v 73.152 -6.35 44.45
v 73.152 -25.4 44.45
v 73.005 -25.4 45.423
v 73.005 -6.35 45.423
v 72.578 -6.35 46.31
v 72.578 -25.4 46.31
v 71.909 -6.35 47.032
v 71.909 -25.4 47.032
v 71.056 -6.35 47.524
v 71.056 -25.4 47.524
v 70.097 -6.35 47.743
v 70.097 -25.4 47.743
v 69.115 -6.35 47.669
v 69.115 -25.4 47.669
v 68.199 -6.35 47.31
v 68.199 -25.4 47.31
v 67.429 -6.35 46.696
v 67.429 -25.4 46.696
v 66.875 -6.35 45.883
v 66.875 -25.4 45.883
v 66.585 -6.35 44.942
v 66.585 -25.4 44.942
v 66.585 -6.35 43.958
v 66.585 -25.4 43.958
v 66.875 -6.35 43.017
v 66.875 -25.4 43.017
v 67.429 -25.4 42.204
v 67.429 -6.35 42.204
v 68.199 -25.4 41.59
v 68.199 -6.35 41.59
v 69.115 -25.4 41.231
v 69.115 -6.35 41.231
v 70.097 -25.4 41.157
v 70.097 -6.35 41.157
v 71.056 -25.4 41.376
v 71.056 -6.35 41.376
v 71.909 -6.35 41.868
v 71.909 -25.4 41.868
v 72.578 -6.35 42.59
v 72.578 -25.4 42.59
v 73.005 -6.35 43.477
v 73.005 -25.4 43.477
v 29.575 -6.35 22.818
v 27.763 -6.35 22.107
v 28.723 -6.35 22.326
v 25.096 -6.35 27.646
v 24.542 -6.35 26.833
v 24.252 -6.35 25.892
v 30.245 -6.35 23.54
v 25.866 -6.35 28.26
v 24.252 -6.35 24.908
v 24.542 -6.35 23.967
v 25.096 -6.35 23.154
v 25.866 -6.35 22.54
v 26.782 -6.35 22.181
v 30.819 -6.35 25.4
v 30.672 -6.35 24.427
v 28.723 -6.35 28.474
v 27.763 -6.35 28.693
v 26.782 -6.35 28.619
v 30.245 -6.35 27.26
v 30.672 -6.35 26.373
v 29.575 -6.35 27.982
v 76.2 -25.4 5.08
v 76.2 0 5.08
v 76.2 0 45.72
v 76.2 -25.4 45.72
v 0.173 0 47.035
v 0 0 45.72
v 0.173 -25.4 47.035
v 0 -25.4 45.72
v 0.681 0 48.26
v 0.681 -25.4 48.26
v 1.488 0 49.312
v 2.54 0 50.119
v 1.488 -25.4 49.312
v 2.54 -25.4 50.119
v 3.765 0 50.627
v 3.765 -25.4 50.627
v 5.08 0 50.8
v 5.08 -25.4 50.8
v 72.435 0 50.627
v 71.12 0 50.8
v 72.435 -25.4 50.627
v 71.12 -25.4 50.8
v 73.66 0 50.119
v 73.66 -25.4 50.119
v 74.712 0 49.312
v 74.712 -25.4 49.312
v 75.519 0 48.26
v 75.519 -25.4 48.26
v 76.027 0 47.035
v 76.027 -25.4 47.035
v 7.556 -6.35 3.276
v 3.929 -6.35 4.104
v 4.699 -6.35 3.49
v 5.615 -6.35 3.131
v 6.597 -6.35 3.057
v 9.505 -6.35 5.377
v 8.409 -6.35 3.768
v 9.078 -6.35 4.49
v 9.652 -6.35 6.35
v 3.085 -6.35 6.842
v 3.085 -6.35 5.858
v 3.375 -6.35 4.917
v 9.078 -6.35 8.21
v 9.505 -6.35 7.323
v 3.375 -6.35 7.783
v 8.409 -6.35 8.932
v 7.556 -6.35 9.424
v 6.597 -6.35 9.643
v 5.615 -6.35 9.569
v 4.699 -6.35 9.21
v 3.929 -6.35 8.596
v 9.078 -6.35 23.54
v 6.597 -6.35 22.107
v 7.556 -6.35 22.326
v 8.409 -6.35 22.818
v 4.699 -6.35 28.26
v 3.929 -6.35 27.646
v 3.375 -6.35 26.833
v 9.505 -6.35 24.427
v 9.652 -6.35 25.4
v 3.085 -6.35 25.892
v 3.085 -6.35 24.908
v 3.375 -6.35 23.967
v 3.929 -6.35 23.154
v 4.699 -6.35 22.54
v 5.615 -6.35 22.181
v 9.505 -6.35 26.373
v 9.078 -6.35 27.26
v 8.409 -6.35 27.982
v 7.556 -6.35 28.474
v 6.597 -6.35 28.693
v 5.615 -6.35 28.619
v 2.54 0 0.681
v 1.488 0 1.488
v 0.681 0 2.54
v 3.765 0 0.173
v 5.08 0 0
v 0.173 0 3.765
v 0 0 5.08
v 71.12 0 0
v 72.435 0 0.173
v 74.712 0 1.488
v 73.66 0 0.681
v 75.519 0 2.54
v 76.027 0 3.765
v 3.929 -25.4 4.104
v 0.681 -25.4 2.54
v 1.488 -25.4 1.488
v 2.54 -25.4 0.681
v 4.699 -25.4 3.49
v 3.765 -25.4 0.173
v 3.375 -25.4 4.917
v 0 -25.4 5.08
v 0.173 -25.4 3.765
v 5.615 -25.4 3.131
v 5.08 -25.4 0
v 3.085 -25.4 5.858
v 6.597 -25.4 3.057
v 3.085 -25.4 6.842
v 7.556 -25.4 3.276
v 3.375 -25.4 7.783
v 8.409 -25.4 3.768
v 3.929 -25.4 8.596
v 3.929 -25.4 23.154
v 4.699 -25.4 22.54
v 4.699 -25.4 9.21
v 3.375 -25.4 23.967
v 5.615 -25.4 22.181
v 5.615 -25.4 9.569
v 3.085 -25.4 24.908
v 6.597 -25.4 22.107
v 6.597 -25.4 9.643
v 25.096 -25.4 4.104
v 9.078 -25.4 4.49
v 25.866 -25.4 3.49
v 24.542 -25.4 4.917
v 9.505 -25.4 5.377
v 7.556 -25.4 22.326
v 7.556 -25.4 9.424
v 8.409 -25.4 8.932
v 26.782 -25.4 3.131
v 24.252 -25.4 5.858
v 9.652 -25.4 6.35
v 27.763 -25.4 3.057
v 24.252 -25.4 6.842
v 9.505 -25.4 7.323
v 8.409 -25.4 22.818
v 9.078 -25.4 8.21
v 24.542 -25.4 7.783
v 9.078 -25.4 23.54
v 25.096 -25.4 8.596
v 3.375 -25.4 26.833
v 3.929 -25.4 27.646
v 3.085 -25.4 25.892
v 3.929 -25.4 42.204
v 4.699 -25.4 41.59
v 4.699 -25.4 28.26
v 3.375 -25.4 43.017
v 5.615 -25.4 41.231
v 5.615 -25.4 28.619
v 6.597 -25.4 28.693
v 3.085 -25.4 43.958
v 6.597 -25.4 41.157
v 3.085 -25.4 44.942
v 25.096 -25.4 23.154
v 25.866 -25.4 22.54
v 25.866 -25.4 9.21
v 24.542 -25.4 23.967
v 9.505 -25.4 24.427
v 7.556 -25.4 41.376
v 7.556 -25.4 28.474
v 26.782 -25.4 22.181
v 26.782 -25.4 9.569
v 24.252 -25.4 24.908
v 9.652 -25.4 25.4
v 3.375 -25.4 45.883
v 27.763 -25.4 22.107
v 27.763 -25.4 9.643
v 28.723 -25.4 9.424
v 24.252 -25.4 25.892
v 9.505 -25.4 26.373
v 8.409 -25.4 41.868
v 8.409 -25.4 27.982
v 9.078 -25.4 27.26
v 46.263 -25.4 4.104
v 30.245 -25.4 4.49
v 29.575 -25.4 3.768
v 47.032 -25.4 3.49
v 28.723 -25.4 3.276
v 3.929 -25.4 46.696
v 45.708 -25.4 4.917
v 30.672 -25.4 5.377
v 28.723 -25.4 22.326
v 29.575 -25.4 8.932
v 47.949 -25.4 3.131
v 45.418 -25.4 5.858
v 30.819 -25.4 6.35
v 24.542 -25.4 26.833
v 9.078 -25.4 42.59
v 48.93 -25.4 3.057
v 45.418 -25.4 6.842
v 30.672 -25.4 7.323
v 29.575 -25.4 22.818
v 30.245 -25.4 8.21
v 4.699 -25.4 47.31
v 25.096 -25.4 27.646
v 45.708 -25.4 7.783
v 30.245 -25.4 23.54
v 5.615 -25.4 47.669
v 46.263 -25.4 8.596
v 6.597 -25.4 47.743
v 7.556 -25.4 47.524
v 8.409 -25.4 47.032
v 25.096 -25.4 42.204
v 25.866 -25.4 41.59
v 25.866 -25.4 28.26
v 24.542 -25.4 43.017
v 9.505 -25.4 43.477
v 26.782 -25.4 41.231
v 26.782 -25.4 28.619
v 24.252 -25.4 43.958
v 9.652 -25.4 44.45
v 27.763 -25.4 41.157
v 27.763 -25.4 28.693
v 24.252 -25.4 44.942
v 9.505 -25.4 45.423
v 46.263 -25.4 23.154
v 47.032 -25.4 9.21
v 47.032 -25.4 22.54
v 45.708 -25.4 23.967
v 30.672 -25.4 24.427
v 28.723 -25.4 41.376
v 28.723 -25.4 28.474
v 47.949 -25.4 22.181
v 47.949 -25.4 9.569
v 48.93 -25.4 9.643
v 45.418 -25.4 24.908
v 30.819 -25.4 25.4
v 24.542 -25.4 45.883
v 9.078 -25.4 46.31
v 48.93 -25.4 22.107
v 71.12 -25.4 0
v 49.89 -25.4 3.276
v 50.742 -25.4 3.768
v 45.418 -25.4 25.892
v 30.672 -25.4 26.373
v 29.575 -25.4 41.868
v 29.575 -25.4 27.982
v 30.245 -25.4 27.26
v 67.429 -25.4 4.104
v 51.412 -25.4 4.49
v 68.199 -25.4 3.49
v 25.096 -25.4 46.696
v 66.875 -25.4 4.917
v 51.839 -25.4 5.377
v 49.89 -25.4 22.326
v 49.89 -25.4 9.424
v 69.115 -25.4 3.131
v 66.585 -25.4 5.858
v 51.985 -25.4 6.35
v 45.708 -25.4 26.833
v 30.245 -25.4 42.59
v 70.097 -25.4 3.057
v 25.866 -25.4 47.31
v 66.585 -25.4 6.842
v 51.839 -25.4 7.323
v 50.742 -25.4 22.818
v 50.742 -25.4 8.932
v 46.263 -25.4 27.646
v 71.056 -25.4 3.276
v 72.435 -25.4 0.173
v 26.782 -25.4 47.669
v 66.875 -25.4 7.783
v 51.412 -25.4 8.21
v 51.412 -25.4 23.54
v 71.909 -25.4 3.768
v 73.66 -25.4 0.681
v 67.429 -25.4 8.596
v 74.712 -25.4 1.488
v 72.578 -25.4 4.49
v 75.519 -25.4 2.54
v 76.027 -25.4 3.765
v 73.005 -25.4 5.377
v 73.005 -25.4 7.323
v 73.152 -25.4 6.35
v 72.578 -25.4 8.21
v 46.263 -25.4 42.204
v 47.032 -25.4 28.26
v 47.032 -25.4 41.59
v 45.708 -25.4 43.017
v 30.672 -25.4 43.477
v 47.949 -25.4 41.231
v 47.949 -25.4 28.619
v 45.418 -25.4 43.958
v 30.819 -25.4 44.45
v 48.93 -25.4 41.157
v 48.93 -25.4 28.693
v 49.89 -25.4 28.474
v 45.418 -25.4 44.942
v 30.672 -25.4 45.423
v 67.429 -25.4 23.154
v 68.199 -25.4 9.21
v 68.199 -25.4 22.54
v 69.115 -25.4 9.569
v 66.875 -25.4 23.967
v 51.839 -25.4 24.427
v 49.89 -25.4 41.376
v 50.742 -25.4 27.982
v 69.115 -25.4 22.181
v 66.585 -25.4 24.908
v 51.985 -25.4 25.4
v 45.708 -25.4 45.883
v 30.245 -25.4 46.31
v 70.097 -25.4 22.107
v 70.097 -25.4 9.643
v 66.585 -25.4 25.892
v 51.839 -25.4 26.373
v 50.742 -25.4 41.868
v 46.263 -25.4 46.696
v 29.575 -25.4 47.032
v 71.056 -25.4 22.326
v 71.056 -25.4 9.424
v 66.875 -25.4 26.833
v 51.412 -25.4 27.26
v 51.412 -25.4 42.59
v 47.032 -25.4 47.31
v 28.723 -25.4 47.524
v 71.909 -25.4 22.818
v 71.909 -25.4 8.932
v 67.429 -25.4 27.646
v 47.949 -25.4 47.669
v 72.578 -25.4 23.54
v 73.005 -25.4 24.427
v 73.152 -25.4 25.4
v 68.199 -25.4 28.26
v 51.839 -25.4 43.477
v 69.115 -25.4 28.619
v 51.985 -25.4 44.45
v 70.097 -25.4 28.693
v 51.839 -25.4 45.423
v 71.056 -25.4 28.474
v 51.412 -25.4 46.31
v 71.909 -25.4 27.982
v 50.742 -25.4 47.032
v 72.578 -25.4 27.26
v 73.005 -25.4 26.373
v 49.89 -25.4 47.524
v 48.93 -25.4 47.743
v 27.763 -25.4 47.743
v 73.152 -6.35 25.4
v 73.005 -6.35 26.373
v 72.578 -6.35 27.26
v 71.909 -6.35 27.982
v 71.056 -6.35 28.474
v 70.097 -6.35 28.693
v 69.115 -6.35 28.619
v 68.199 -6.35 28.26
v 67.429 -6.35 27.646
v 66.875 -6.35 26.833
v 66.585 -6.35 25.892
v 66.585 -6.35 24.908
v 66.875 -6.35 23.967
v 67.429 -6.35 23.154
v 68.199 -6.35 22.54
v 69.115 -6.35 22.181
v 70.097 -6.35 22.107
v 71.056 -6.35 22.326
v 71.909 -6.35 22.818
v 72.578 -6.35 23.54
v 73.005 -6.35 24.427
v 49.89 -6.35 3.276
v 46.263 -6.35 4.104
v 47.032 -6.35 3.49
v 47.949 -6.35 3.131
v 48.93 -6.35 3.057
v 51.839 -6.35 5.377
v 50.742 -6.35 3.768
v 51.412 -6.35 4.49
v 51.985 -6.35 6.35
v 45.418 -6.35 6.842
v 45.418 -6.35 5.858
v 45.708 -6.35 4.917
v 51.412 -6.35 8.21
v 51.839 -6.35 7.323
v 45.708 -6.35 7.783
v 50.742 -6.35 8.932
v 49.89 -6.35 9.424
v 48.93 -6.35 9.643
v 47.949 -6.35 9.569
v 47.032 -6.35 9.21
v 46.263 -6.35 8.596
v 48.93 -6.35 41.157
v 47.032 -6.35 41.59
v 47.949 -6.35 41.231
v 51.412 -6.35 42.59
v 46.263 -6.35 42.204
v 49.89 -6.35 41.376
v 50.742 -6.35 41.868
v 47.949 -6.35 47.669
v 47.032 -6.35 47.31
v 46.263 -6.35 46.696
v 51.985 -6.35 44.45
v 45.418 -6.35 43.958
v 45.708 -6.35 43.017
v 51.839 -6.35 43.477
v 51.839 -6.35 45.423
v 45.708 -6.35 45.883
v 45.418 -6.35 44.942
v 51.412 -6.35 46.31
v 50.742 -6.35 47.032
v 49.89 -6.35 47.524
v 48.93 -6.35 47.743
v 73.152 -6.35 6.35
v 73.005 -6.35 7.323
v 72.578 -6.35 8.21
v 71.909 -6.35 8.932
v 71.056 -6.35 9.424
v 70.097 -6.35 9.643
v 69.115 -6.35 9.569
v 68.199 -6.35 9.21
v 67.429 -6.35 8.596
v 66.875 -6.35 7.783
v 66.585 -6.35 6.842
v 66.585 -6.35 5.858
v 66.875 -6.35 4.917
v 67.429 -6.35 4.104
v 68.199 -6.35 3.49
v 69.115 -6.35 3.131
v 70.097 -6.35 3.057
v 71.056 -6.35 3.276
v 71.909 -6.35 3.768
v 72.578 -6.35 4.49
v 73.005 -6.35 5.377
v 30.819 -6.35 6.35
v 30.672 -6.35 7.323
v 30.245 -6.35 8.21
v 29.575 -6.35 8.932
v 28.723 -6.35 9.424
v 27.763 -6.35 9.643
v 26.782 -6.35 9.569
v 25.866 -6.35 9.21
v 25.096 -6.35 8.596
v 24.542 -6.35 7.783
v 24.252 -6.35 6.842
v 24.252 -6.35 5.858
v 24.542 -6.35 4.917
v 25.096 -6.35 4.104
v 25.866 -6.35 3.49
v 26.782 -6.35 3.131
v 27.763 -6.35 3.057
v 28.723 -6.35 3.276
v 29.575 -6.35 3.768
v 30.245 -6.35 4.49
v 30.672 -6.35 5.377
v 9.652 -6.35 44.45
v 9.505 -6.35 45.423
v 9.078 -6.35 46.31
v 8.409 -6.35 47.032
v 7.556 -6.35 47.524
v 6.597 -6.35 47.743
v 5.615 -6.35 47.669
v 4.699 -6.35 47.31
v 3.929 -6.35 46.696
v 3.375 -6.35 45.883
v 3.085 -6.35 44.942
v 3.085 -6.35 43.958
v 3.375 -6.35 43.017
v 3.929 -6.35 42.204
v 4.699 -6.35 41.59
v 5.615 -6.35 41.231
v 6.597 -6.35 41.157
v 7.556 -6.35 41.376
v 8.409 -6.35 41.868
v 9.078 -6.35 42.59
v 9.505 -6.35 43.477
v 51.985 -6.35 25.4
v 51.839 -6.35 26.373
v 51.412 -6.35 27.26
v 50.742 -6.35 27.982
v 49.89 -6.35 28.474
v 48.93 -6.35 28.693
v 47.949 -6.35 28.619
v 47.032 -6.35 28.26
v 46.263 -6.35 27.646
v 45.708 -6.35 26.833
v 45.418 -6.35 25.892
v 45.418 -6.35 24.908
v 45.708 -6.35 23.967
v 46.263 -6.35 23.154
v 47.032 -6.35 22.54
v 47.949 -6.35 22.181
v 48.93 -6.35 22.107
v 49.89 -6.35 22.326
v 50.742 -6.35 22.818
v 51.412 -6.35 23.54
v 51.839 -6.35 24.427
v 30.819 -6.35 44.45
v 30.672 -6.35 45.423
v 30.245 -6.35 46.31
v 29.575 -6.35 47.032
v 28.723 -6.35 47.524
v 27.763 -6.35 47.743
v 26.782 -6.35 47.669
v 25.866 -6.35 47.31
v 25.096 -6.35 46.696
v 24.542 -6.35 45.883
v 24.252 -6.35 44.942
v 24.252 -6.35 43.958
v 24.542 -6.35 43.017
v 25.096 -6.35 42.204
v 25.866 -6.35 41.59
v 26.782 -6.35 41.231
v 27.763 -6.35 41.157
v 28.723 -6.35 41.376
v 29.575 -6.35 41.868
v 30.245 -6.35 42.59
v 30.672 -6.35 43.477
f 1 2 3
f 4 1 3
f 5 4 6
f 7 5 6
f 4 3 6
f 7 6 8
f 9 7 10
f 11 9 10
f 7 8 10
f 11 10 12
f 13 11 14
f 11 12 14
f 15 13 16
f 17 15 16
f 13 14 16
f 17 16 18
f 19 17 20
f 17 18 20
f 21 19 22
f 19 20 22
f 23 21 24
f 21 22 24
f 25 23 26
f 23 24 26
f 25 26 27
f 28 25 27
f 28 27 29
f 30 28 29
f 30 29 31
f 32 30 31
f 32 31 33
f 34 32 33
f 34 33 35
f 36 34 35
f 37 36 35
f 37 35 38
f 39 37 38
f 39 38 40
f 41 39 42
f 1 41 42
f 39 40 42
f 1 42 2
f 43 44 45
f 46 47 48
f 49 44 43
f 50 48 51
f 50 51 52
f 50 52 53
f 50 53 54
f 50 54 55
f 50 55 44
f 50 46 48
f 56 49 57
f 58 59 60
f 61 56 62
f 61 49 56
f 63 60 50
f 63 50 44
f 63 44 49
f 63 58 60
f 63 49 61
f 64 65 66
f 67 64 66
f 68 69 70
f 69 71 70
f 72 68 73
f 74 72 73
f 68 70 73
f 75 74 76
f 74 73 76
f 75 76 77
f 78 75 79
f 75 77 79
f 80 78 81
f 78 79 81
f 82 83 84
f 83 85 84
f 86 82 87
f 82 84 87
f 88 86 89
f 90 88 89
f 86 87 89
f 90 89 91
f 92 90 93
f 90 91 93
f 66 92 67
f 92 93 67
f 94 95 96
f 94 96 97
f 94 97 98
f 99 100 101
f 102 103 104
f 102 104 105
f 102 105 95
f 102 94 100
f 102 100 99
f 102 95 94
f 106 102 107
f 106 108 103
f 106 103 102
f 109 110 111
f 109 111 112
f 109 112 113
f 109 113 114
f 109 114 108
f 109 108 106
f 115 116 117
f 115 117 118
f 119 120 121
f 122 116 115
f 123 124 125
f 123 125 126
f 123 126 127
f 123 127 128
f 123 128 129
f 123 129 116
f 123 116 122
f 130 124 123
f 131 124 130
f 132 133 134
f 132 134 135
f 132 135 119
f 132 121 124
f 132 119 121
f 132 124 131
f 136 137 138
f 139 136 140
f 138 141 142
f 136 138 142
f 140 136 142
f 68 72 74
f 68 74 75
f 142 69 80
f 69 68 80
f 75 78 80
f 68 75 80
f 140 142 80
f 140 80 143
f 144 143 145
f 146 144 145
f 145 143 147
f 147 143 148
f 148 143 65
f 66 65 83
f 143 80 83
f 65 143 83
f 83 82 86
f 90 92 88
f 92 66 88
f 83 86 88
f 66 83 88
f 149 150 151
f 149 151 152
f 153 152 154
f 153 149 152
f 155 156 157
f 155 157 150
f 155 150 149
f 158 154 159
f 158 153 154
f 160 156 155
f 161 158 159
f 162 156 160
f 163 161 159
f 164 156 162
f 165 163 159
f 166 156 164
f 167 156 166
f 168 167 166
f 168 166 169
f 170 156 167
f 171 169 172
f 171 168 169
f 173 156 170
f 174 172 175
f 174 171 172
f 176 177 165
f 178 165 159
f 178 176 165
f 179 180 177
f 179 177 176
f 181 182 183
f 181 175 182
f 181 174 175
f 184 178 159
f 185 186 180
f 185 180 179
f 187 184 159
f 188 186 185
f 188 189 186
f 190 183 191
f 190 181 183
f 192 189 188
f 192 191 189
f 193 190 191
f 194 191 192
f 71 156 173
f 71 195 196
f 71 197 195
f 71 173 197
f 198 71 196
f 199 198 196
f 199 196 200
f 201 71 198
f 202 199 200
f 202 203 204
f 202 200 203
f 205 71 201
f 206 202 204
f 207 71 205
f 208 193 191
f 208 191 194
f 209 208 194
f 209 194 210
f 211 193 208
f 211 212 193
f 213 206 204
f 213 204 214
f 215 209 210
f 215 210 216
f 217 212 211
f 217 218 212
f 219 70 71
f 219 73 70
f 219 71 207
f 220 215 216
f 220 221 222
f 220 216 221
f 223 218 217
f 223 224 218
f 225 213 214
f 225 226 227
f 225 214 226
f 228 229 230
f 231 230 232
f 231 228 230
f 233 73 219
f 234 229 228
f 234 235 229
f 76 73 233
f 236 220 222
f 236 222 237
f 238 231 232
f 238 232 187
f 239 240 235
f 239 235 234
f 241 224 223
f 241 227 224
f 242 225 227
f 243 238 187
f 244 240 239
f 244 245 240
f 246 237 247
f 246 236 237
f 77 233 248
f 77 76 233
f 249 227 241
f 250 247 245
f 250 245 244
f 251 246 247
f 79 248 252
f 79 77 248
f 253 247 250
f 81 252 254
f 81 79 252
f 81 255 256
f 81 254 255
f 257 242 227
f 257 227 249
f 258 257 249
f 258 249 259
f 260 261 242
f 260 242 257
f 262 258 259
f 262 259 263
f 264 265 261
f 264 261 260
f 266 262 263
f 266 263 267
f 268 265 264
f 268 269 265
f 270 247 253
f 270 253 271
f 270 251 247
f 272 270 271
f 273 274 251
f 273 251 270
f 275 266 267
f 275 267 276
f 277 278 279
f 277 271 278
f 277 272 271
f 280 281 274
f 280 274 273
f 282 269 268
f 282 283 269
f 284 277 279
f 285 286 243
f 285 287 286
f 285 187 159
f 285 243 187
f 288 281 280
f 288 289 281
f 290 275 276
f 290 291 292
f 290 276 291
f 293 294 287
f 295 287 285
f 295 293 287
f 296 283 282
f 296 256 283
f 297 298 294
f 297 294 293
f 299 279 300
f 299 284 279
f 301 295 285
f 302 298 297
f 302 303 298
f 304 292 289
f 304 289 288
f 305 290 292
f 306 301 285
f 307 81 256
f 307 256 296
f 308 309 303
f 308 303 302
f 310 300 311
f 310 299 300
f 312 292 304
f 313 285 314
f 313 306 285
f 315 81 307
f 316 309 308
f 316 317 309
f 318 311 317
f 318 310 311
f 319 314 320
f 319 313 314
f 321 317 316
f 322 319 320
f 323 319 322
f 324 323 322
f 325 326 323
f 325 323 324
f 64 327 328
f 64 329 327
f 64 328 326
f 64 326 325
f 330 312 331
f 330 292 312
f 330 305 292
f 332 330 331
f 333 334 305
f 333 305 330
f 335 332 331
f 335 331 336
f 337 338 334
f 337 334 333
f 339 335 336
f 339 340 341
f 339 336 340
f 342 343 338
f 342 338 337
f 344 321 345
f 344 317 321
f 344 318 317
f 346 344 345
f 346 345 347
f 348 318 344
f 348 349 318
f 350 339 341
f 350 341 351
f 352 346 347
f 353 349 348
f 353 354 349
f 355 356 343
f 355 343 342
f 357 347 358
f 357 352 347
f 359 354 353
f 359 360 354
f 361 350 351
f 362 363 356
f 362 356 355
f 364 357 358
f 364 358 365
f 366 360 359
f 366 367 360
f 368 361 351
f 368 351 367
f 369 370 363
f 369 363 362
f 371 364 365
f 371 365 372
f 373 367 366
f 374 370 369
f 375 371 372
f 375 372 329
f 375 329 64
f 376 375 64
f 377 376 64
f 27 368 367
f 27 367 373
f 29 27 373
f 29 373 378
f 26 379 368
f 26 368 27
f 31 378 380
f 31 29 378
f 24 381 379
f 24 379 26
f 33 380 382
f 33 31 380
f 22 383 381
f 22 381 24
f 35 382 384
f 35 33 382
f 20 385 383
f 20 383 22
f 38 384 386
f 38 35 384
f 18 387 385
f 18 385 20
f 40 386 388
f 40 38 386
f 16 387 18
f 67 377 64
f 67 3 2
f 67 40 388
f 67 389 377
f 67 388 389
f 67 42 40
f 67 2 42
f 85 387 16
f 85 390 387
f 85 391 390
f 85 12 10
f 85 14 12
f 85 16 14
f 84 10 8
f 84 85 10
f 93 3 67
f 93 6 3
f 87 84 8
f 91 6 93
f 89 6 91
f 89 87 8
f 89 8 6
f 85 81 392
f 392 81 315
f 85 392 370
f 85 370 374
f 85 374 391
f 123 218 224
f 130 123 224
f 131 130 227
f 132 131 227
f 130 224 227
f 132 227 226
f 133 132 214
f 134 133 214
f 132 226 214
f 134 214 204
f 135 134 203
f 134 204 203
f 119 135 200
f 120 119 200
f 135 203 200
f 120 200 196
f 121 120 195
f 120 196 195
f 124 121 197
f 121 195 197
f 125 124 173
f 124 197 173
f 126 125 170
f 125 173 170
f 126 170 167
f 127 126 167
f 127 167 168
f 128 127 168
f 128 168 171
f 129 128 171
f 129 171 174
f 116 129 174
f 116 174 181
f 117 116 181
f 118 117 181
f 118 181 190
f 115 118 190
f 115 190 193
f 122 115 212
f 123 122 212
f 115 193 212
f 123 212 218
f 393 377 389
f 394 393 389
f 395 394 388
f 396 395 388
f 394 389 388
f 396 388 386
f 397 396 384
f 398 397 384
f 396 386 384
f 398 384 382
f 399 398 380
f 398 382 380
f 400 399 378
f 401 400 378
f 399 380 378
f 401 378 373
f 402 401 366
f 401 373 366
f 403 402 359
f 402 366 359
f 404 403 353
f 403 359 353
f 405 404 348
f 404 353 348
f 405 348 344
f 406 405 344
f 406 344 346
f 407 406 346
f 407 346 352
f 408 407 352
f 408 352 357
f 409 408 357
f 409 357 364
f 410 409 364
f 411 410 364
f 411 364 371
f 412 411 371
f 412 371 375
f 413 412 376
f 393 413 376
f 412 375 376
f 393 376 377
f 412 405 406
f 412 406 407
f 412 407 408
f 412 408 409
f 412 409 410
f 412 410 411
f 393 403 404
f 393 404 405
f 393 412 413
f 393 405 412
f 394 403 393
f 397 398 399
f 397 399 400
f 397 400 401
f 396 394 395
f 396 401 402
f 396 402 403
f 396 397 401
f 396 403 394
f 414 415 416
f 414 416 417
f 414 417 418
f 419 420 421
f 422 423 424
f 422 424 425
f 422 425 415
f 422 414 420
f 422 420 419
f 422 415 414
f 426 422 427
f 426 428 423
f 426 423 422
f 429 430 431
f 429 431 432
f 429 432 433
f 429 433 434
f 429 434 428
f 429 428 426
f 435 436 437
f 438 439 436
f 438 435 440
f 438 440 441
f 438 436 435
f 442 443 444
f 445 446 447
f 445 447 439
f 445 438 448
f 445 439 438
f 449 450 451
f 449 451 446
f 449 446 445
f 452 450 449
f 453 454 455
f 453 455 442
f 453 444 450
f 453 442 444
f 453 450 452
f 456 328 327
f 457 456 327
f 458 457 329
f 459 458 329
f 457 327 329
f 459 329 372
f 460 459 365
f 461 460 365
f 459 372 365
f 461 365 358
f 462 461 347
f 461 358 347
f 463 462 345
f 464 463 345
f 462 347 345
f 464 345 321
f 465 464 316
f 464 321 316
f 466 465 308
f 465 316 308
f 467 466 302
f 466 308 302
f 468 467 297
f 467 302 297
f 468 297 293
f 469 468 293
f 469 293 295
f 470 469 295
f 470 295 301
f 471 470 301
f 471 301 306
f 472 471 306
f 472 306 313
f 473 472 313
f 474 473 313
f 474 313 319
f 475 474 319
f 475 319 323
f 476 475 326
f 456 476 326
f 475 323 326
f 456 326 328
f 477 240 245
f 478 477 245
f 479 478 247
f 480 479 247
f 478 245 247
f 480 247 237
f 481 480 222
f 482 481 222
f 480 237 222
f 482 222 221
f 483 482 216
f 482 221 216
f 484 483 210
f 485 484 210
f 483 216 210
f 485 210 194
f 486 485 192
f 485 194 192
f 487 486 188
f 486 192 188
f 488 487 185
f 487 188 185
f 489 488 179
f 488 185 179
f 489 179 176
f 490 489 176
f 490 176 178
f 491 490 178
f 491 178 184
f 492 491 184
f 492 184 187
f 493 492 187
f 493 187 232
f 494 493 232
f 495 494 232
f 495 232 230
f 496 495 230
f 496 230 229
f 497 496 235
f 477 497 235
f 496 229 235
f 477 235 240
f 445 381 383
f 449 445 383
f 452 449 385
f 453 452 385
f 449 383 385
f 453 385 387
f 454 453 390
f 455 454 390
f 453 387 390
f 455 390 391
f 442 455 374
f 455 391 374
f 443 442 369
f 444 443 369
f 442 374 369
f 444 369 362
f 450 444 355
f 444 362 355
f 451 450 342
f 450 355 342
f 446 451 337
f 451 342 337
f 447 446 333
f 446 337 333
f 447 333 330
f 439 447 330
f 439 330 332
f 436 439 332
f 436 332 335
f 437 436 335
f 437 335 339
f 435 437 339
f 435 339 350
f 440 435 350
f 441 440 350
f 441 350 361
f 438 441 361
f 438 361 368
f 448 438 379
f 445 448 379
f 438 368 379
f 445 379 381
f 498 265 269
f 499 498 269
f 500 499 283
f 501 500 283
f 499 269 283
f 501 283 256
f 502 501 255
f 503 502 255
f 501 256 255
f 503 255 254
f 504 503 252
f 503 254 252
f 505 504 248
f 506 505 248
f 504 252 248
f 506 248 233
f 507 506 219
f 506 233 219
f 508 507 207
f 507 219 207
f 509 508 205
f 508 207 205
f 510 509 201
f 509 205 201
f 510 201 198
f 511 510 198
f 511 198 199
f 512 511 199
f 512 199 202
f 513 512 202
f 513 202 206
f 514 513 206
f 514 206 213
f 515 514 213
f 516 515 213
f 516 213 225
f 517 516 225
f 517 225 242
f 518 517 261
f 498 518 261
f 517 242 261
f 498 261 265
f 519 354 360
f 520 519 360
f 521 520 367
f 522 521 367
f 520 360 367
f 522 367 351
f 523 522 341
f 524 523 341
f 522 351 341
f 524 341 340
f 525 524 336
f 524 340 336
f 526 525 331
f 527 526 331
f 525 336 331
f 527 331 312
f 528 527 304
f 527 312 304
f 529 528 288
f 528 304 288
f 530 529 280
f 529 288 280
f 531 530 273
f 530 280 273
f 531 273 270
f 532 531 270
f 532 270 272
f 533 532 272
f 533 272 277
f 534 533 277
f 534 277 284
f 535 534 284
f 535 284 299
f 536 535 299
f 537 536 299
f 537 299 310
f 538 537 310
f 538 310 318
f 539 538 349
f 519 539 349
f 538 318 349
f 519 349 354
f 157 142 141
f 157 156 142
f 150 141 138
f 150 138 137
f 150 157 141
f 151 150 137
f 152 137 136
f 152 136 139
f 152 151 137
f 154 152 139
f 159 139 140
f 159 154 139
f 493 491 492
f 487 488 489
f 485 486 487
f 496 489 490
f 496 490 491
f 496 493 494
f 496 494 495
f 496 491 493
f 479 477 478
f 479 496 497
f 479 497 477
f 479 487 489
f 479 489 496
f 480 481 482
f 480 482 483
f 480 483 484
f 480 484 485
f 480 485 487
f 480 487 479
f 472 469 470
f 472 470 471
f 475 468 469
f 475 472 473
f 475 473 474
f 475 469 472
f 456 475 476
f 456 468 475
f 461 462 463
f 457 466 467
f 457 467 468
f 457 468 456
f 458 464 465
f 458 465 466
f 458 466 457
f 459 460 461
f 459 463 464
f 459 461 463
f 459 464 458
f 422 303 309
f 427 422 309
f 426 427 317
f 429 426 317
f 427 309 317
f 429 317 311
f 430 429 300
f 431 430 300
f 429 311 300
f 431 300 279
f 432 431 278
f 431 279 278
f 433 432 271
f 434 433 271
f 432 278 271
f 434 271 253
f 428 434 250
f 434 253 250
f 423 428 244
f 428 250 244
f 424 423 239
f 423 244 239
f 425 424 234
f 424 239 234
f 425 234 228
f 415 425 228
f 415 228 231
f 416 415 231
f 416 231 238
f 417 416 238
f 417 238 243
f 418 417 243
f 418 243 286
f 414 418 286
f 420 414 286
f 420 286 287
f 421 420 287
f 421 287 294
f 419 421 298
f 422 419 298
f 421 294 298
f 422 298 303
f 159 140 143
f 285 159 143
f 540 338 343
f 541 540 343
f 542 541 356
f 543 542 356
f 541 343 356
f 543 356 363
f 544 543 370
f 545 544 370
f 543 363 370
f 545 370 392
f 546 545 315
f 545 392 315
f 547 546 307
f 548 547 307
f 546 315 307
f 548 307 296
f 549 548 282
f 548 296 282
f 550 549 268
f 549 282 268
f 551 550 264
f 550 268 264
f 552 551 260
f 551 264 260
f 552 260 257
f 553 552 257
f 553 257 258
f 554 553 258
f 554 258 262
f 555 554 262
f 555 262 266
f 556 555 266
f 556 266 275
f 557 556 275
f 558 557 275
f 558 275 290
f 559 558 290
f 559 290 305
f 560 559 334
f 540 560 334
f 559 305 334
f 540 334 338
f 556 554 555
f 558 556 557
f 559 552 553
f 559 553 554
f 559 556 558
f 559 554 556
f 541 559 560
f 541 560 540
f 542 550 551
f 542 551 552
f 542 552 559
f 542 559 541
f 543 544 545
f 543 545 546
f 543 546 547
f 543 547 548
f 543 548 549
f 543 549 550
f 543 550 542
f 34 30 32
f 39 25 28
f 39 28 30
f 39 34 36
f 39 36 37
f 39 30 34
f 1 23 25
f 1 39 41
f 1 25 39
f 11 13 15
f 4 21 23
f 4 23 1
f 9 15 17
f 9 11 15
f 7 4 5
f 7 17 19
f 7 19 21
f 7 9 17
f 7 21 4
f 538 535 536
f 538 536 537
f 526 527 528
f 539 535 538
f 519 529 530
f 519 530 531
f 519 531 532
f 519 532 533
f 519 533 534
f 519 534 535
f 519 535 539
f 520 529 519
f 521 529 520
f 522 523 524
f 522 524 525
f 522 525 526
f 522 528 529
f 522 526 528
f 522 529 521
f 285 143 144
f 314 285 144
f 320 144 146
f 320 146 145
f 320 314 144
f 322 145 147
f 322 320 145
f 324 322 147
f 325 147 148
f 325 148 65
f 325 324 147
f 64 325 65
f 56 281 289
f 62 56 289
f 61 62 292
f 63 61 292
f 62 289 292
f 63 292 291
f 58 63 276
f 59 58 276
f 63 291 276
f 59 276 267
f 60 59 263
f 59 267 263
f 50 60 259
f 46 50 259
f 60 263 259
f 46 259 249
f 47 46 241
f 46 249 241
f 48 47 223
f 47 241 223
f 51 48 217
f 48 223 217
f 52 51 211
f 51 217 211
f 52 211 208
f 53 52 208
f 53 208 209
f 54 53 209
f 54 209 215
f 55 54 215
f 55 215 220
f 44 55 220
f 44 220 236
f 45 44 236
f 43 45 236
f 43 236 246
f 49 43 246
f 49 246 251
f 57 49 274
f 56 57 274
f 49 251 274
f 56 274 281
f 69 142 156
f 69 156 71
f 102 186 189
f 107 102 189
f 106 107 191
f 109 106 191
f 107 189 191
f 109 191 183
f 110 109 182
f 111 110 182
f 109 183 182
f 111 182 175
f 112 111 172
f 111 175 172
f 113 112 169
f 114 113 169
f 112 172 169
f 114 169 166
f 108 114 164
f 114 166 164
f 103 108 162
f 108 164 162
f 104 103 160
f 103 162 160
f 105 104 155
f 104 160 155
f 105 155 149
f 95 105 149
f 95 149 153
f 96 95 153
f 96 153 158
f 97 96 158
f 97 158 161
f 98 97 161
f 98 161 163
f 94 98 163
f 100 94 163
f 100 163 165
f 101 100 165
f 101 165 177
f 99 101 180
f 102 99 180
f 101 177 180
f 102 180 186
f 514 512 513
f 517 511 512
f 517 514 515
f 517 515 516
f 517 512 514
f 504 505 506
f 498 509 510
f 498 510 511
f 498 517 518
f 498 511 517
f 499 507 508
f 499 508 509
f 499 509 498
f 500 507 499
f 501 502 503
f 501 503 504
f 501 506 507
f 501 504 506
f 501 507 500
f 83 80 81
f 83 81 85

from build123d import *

# Parameters (mm, degrees)
F0_W     = 76.2
F0_H     = 50.8
F1_DEPTH = 25.4
F2_R     = 3.302
F3_DEPTH = 19.05
F4_R     = 5.08


with BuildPart() as f1:
    # F0 (on Front) → F1 (new body)
    with BuildSketch(Plane.XZ):
        with Locations((38.1, 25.4)):
            Rectangle(F0_W, F0_H)
    extrude(amount=F1_DEPTH)

    # F2 (on face) → F3 (cut)
    with BuildSketch(Plane.XZ.offset(25.4)):
        with Locations((69.85, 6.35)):
            Circle(F2_R)
        with Locations((69.85, 25.4)):
            Circle(F2_R)
        with Locations((69.85, 44.45)):
            Circle(F2_R)
        with Locations((48.683333, 6.35)):
            Circle(F2_R)
        with Locations((48.683333, 25.4)):
            Circle(F2_R)
        with Locations((48.683333, 44.45)):
            Circle(F2_R)
        with Locations((27.516667, 6.35)):
            Circle(F2_R)
        with Locations((27.516667, 25.4)):
            Circle(F2_R)
        with Locations((27.516667, 44.45)):
            Circle(F2_R)
        with Locations((6.35, 6.35)):
            Circle(F2_R)
        with Locations((6.35, 25.4)):
            Circle(F2_R)
        with Locations((6.35, 44.45)):
            Circle(F2_R)
    extrude(amount=-F3_DEPTH, mode=Mode.SUBTRACT)

    # F4
    f4_edges = [f1.edges().sort_by_distance(p)[0] for p in [
        (76.2, -12.7, 50.8),
        (0, -12.7, 50.8),
        (0, -12.7, 0),
        (76.2, -12.7, 0),
    ]]
    fillet(f4_edges, radius=F4_R)


solid = f1.part
